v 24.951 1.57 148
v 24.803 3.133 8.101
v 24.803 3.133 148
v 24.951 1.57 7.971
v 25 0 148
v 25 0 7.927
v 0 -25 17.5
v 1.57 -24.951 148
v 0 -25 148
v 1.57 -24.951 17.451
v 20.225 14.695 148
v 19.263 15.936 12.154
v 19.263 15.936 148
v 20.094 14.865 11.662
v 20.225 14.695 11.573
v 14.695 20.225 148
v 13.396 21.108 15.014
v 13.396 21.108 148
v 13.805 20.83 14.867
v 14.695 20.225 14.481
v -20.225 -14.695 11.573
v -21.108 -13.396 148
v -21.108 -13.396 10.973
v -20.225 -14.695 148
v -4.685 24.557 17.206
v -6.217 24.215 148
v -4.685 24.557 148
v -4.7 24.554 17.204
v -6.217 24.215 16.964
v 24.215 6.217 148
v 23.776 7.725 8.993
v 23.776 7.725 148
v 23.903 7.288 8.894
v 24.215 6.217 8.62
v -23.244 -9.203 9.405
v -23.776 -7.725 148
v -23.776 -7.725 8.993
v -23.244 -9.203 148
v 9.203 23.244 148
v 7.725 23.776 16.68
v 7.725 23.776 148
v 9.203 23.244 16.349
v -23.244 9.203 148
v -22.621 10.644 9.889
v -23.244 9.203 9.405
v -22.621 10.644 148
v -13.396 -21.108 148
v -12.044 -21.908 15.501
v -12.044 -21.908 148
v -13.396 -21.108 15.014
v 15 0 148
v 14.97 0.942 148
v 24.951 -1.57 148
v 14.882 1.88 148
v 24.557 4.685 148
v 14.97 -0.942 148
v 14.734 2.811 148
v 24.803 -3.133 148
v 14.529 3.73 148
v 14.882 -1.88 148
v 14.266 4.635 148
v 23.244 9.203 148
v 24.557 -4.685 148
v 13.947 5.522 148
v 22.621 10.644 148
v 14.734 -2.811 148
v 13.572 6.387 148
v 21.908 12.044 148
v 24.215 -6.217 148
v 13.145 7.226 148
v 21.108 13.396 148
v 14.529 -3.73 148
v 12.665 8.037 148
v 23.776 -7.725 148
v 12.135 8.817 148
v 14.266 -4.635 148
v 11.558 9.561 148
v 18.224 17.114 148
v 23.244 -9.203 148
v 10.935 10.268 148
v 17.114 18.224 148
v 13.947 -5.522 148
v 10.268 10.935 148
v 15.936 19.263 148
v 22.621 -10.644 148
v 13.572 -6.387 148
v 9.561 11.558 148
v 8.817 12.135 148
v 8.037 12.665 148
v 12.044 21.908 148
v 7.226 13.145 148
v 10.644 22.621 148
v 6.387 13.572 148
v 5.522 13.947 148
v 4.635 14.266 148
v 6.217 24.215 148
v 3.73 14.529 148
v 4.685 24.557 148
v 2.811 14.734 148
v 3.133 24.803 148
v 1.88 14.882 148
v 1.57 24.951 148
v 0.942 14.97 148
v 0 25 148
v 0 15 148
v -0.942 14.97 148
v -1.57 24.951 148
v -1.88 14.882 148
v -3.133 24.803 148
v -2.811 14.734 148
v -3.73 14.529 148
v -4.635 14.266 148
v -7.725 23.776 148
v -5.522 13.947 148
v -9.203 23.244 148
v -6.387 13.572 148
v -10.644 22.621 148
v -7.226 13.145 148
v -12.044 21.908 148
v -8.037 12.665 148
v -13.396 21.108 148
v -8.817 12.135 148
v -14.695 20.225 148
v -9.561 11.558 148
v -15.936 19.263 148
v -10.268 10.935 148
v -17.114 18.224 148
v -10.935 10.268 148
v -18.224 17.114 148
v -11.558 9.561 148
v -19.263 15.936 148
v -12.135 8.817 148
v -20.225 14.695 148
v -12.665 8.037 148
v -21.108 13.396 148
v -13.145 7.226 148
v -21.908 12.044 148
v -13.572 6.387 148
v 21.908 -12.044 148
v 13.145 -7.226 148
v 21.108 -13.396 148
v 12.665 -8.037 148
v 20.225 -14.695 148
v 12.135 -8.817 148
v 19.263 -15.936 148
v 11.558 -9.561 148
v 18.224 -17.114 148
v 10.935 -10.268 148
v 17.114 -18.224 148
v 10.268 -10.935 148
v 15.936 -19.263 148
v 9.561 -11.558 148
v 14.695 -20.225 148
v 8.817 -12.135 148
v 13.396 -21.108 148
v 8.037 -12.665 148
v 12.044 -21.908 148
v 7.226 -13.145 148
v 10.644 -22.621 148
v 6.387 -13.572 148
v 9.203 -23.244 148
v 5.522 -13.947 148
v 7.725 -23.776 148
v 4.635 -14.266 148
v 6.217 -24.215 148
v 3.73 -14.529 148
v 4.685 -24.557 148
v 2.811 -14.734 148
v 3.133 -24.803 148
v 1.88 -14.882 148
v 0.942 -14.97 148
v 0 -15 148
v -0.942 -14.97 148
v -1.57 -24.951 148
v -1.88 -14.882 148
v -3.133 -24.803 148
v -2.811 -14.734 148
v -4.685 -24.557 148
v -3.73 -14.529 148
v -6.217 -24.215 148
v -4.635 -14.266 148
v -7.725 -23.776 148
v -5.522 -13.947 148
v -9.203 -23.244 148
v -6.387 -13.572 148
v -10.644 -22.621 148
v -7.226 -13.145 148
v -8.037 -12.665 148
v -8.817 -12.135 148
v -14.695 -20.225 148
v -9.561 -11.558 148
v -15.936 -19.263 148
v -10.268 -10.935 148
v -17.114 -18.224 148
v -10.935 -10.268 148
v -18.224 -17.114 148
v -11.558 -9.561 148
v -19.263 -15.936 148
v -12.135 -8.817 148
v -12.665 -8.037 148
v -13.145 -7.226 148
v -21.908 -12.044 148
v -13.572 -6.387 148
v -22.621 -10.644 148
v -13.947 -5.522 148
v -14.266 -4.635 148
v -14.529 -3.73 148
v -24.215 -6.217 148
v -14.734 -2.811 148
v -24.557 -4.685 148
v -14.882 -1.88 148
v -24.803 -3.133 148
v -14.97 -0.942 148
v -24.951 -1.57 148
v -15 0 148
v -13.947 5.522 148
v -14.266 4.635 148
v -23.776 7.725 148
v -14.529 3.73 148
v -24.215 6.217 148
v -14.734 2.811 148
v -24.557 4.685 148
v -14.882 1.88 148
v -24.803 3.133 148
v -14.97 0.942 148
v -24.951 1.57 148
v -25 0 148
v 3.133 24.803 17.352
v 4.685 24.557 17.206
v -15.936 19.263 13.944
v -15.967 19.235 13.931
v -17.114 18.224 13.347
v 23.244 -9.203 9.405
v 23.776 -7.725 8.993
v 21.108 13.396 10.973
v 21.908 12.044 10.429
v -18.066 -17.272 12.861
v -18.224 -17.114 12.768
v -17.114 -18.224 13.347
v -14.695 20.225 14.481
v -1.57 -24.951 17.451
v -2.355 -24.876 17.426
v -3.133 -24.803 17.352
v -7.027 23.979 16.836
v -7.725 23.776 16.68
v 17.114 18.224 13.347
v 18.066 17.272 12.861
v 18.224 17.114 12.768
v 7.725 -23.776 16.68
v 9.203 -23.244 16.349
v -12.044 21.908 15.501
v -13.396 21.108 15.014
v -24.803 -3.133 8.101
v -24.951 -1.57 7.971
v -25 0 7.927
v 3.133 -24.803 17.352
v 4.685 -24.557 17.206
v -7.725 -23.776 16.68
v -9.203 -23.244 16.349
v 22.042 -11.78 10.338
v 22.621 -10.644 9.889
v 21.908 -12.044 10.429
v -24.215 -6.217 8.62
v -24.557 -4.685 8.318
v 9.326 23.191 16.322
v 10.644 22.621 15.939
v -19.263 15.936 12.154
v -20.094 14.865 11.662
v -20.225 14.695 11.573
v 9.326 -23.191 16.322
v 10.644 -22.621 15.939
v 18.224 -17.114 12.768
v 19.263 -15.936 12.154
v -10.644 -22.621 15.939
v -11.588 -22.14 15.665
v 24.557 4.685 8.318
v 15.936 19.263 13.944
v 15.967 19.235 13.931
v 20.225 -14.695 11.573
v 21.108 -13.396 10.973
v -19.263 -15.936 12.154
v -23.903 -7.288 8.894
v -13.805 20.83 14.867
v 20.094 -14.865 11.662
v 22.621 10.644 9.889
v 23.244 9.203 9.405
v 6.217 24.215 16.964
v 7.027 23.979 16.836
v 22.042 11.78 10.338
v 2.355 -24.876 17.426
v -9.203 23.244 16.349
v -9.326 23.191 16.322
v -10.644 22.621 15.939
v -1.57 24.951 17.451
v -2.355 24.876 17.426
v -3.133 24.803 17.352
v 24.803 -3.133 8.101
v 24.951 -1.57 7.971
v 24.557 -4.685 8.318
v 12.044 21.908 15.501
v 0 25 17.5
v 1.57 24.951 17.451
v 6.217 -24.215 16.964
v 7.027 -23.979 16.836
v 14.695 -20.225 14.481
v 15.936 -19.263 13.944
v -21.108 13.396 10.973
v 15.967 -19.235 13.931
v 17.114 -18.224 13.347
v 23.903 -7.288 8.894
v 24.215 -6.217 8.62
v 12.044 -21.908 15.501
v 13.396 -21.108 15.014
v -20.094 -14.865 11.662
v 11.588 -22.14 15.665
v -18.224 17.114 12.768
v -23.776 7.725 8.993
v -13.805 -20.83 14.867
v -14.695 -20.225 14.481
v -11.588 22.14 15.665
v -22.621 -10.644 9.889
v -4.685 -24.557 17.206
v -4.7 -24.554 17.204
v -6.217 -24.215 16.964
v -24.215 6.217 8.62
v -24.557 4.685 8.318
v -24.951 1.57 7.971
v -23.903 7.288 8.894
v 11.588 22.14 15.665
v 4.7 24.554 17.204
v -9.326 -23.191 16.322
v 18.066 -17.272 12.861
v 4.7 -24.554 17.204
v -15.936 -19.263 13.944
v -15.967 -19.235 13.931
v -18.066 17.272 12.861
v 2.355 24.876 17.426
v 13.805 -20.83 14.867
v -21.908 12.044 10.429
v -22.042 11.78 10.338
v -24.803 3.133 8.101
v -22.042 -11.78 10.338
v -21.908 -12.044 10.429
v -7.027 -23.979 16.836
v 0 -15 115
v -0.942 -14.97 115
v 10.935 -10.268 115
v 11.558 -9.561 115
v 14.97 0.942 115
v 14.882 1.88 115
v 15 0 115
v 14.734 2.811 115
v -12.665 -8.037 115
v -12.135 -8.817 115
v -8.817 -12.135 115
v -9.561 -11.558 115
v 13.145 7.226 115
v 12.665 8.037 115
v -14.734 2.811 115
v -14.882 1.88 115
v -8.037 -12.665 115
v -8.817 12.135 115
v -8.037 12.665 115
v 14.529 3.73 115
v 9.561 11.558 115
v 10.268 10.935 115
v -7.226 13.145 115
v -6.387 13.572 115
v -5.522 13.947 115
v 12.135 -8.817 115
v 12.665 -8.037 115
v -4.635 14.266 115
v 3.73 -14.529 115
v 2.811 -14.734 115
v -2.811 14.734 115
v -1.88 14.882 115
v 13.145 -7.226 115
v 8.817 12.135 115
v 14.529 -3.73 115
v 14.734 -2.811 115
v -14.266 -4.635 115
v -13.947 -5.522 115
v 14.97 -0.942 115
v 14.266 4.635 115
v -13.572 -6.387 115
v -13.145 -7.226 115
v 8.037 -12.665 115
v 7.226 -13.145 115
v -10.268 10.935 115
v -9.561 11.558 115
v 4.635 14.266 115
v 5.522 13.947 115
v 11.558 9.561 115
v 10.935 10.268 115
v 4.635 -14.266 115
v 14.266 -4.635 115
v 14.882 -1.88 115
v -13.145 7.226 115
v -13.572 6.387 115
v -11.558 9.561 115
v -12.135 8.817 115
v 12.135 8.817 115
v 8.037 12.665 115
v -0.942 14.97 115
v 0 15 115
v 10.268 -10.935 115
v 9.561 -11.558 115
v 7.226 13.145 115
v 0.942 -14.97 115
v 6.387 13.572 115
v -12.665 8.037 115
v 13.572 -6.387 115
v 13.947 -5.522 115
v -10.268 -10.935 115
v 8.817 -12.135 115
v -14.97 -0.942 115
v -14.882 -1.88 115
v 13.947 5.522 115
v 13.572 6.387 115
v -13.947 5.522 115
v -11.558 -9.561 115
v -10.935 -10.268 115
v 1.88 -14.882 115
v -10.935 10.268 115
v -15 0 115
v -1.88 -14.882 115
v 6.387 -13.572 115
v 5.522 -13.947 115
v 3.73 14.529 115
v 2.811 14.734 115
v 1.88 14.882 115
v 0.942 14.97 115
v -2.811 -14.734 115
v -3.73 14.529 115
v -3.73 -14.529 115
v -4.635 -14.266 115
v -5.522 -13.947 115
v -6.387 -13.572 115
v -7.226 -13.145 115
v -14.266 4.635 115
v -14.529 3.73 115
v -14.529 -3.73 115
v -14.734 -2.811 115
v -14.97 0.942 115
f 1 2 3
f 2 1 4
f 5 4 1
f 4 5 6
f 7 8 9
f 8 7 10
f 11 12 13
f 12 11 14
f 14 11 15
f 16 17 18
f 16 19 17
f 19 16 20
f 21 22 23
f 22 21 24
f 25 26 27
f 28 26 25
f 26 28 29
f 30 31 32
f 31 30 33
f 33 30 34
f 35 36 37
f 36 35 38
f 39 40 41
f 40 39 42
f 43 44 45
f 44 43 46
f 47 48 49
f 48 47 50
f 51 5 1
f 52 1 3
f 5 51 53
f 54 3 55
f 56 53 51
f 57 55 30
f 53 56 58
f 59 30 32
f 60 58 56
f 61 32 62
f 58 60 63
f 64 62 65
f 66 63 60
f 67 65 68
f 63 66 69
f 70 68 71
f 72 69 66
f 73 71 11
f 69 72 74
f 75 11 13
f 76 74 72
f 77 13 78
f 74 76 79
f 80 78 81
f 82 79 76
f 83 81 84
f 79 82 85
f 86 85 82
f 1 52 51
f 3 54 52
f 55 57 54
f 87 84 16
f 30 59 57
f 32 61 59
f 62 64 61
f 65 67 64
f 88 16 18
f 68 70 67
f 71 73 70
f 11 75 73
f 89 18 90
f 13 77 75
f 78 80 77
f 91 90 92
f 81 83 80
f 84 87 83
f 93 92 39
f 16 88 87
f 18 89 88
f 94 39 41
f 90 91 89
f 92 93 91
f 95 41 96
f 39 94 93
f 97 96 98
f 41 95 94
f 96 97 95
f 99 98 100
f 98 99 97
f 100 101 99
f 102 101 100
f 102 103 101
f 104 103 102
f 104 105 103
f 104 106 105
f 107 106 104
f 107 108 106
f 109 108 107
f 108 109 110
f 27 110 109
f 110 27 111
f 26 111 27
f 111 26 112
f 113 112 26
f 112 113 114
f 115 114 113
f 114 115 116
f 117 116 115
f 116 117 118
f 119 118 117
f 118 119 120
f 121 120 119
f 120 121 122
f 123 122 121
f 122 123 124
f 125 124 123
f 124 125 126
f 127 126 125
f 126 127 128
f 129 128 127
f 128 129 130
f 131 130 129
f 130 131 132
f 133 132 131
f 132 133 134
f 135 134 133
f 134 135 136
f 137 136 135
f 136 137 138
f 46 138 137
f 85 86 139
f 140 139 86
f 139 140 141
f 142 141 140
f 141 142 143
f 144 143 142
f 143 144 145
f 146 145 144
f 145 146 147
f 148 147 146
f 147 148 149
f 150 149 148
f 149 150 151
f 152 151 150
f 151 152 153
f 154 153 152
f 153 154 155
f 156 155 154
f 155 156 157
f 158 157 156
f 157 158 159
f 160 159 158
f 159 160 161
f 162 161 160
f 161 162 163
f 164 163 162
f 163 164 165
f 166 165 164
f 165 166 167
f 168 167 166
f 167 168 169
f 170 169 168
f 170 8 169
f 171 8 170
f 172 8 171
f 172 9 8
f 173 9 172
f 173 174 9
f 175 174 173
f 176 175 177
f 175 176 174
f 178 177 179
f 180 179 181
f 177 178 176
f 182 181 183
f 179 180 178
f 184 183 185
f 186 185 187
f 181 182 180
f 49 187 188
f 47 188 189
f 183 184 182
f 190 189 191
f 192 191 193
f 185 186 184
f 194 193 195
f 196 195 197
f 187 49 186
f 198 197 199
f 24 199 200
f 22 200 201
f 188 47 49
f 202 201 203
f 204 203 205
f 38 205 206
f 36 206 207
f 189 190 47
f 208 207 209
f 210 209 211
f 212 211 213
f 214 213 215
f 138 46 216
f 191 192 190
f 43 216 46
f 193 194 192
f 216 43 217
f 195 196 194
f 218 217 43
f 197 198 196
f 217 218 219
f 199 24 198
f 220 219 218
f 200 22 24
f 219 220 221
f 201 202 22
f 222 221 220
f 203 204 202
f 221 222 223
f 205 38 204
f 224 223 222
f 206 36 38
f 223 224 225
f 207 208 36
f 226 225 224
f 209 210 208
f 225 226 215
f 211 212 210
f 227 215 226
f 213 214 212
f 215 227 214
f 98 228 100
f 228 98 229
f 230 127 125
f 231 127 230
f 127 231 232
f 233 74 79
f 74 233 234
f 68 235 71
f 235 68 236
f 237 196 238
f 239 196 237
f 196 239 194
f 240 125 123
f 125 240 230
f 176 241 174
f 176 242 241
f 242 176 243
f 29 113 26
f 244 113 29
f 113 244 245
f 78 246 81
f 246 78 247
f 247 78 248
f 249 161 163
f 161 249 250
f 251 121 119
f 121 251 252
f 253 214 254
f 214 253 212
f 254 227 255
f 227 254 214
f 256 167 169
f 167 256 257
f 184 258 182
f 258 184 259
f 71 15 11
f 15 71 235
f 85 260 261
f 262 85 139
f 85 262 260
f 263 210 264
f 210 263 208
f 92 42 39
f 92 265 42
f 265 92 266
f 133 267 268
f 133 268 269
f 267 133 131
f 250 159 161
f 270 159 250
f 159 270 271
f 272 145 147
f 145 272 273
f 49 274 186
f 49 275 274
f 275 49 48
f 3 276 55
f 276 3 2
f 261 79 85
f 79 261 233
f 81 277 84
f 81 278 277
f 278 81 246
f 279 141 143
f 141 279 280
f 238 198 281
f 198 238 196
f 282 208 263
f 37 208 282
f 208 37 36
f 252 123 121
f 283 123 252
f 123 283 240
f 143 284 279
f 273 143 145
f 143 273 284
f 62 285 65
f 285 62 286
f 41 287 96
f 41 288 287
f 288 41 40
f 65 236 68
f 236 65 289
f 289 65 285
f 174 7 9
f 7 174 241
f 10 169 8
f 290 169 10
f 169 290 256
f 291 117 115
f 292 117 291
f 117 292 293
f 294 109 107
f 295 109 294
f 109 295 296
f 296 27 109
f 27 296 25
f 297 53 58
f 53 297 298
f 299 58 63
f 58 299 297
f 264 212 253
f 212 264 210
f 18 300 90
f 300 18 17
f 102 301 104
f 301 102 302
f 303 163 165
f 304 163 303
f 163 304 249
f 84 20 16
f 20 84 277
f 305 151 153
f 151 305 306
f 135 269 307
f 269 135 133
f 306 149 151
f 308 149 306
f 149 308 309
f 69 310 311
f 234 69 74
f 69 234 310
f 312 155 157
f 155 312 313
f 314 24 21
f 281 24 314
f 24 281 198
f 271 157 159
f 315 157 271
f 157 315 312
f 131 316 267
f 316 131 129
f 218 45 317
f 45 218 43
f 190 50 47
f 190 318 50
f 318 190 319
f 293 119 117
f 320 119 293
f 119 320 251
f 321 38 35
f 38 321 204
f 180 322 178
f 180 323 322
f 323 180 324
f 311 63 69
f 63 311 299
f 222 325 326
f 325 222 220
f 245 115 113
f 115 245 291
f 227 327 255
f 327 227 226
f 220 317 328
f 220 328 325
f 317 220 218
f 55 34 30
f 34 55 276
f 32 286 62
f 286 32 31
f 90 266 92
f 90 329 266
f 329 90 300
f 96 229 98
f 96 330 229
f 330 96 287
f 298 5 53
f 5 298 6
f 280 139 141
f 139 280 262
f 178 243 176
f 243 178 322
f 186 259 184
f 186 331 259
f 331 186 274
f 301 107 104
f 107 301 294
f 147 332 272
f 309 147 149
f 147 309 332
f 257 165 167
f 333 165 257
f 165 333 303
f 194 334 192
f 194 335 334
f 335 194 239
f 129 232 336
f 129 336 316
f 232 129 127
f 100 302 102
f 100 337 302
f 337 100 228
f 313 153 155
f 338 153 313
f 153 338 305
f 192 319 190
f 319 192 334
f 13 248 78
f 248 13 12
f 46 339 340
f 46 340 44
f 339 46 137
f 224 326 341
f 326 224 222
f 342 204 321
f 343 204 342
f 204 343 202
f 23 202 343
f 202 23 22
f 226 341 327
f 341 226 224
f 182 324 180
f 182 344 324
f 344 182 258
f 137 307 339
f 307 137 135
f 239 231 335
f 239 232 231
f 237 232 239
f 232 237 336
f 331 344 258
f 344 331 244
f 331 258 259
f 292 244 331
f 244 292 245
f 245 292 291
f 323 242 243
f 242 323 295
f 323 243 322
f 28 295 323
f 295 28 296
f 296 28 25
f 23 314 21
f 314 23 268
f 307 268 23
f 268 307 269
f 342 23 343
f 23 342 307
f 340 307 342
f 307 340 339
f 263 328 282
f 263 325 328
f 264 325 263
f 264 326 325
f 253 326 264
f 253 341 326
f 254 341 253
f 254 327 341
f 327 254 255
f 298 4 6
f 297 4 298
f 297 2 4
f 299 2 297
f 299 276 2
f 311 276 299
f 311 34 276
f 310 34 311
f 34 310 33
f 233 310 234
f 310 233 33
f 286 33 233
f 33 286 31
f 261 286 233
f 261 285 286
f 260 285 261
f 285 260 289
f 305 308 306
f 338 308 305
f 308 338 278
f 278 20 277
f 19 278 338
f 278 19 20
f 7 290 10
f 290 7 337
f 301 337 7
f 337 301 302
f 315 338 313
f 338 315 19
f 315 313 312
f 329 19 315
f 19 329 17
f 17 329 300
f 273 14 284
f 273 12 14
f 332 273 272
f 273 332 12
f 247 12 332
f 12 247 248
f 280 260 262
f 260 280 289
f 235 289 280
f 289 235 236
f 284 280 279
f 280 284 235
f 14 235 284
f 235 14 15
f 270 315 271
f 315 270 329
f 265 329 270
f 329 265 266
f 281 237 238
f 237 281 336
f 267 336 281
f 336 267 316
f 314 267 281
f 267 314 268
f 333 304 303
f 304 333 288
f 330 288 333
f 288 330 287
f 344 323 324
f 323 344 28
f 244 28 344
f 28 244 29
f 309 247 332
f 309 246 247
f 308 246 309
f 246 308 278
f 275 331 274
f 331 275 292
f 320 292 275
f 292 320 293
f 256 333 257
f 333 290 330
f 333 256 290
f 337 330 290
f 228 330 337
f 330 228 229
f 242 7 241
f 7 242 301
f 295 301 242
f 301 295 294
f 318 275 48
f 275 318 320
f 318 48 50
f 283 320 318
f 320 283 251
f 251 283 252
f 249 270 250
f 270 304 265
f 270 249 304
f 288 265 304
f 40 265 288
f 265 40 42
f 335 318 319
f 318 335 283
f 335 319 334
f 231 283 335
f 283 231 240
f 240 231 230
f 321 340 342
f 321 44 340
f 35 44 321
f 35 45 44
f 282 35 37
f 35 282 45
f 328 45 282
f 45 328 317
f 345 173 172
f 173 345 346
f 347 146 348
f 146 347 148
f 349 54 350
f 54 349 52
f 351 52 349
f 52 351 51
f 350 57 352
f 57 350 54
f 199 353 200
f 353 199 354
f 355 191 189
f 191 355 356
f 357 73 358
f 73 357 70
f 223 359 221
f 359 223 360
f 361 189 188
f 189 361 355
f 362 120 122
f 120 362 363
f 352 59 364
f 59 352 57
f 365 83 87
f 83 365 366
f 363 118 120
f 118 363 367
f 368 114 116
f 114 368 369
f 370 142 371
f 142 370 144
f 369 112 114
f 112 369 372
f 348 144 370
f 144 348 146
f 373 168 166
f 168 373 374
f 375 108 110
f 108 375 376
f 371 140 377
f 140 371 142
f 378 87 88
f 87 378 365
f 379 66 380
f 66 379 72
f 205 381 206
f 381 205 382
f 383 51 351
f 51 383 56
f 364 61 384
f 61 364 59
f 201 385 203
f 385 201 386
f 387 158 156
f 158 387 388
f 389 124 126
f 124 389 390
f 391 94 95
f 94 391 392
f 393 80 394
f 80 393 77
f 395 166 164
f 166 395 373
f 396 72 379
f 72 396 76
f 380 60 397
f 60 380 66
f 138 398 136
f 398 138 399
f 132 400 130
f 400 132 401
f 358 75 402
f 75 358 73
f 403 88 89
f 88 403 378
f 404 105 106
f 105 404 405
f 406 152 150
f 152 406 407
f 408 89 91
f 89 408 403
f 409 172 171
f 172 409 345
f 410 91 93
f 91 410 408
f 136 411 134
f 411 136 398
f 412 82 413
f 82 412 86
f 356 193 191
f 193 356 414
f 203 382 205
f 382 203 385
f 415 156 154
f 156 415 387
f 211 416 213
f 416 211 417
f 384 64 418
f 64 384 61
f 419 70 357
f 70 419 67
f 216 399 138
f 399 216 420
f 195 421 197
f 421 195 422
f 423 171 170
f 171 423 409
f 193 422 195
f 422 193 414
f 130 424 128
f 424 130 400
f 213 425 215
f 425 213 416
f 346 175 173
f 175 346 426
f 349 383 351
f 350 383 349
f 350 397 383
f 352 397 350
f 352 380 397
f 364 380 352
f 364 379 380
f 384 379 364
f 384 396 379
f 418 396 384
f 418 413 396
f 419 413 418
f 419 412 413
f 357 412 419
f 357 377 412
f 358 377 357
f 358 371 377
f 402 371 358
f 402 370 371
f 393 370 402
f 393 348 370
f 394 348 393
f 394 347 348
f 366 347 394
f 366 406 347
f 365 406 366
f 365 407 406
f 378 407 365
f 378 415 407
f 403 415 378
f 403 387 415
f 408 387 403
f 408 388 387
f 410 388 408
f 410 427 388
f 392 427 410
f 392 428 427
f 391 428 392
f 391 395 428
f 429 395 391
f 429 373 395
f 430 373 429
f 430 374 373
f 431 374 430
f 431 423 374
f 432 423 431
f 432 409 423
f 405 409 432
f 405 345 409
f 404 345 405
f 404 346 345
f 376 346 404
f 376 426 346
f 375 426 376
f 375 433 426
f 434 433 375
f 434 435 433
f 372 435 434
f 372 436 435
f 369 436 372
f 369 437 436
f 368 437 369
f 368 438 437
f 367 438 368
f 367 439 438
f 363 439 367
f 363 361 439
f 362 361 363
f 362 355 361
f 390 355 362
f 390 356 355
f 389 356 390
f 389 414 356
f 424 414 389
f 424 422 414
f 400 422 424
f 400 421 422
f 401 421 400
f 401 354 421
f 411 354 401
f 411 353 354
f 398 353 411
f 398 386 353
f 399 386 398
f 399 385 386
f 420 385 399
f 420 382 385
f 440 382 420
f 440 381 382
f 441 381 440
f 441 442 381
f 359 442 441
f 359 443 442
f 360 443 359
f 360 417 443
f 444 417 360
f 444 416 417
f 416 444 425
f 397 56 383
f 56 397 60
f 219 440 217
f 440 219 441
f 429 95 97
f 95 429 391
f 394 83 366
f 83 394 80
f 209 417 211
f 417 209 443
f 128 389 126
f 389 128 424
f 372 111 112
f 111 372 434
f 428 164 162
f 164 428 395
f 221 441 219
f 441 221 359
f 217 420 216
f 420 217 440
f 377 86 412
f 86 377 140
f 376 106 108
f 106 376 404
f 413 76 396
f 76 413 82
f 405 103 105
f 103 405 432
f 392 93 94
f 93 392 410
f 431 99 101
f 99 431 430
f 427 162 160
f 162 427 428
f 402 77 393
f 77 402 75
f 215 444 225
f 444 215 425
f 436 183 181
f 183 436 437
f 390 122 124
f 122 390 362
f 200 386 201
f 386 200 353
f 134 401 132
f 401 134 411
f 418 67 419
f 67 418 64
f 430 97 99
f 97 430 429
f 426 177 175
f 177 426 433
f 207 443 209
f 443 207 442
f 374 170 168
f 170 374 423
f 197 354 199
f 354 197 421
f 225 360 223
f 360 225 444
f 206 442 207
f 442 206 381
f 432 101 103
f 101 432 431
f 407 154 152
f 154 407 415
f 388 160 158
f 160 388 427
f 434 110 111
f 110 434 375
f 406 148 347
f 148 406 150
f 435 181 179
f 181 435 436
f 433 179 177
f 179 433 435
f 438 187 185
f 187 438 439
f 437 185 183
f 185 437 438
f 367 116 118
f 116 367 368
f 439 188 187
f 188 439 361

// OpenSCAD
$fn = 100;
mycylheight = 150; // height of cylinder used to cut dip in top of the stand 
mycyl = 75; // width of cylinder used to cut dip in top of the stand
cutwidth = 30; // width (mm) of circular cutout
cutheight = 60; // height (mm) of circular cutout
standwidth = 50; // width (mm) of stand
standheight = 168; // height (mm) of stand
rotation = 90; // angle at which cut is relative to stand
cutdepth = 115; // distance of the top of the stand to the cutout
cyldistance = 25; // distance of cylinder used to cut dip from [0,0,0]
difference(){
translate([0,0,-20]){
difference(){
    cylinder(d=standwidth,h=standheight);
    translate([0,cyldistance,0]){ 
    rotate([rotation,0,0])
    
    cylinder(d=mycyl,h=mycylheight);
    }
}
}
translate([0,0,cutdepth]){
cylinder(d=cutwidth, h=cutheight);
}
}
